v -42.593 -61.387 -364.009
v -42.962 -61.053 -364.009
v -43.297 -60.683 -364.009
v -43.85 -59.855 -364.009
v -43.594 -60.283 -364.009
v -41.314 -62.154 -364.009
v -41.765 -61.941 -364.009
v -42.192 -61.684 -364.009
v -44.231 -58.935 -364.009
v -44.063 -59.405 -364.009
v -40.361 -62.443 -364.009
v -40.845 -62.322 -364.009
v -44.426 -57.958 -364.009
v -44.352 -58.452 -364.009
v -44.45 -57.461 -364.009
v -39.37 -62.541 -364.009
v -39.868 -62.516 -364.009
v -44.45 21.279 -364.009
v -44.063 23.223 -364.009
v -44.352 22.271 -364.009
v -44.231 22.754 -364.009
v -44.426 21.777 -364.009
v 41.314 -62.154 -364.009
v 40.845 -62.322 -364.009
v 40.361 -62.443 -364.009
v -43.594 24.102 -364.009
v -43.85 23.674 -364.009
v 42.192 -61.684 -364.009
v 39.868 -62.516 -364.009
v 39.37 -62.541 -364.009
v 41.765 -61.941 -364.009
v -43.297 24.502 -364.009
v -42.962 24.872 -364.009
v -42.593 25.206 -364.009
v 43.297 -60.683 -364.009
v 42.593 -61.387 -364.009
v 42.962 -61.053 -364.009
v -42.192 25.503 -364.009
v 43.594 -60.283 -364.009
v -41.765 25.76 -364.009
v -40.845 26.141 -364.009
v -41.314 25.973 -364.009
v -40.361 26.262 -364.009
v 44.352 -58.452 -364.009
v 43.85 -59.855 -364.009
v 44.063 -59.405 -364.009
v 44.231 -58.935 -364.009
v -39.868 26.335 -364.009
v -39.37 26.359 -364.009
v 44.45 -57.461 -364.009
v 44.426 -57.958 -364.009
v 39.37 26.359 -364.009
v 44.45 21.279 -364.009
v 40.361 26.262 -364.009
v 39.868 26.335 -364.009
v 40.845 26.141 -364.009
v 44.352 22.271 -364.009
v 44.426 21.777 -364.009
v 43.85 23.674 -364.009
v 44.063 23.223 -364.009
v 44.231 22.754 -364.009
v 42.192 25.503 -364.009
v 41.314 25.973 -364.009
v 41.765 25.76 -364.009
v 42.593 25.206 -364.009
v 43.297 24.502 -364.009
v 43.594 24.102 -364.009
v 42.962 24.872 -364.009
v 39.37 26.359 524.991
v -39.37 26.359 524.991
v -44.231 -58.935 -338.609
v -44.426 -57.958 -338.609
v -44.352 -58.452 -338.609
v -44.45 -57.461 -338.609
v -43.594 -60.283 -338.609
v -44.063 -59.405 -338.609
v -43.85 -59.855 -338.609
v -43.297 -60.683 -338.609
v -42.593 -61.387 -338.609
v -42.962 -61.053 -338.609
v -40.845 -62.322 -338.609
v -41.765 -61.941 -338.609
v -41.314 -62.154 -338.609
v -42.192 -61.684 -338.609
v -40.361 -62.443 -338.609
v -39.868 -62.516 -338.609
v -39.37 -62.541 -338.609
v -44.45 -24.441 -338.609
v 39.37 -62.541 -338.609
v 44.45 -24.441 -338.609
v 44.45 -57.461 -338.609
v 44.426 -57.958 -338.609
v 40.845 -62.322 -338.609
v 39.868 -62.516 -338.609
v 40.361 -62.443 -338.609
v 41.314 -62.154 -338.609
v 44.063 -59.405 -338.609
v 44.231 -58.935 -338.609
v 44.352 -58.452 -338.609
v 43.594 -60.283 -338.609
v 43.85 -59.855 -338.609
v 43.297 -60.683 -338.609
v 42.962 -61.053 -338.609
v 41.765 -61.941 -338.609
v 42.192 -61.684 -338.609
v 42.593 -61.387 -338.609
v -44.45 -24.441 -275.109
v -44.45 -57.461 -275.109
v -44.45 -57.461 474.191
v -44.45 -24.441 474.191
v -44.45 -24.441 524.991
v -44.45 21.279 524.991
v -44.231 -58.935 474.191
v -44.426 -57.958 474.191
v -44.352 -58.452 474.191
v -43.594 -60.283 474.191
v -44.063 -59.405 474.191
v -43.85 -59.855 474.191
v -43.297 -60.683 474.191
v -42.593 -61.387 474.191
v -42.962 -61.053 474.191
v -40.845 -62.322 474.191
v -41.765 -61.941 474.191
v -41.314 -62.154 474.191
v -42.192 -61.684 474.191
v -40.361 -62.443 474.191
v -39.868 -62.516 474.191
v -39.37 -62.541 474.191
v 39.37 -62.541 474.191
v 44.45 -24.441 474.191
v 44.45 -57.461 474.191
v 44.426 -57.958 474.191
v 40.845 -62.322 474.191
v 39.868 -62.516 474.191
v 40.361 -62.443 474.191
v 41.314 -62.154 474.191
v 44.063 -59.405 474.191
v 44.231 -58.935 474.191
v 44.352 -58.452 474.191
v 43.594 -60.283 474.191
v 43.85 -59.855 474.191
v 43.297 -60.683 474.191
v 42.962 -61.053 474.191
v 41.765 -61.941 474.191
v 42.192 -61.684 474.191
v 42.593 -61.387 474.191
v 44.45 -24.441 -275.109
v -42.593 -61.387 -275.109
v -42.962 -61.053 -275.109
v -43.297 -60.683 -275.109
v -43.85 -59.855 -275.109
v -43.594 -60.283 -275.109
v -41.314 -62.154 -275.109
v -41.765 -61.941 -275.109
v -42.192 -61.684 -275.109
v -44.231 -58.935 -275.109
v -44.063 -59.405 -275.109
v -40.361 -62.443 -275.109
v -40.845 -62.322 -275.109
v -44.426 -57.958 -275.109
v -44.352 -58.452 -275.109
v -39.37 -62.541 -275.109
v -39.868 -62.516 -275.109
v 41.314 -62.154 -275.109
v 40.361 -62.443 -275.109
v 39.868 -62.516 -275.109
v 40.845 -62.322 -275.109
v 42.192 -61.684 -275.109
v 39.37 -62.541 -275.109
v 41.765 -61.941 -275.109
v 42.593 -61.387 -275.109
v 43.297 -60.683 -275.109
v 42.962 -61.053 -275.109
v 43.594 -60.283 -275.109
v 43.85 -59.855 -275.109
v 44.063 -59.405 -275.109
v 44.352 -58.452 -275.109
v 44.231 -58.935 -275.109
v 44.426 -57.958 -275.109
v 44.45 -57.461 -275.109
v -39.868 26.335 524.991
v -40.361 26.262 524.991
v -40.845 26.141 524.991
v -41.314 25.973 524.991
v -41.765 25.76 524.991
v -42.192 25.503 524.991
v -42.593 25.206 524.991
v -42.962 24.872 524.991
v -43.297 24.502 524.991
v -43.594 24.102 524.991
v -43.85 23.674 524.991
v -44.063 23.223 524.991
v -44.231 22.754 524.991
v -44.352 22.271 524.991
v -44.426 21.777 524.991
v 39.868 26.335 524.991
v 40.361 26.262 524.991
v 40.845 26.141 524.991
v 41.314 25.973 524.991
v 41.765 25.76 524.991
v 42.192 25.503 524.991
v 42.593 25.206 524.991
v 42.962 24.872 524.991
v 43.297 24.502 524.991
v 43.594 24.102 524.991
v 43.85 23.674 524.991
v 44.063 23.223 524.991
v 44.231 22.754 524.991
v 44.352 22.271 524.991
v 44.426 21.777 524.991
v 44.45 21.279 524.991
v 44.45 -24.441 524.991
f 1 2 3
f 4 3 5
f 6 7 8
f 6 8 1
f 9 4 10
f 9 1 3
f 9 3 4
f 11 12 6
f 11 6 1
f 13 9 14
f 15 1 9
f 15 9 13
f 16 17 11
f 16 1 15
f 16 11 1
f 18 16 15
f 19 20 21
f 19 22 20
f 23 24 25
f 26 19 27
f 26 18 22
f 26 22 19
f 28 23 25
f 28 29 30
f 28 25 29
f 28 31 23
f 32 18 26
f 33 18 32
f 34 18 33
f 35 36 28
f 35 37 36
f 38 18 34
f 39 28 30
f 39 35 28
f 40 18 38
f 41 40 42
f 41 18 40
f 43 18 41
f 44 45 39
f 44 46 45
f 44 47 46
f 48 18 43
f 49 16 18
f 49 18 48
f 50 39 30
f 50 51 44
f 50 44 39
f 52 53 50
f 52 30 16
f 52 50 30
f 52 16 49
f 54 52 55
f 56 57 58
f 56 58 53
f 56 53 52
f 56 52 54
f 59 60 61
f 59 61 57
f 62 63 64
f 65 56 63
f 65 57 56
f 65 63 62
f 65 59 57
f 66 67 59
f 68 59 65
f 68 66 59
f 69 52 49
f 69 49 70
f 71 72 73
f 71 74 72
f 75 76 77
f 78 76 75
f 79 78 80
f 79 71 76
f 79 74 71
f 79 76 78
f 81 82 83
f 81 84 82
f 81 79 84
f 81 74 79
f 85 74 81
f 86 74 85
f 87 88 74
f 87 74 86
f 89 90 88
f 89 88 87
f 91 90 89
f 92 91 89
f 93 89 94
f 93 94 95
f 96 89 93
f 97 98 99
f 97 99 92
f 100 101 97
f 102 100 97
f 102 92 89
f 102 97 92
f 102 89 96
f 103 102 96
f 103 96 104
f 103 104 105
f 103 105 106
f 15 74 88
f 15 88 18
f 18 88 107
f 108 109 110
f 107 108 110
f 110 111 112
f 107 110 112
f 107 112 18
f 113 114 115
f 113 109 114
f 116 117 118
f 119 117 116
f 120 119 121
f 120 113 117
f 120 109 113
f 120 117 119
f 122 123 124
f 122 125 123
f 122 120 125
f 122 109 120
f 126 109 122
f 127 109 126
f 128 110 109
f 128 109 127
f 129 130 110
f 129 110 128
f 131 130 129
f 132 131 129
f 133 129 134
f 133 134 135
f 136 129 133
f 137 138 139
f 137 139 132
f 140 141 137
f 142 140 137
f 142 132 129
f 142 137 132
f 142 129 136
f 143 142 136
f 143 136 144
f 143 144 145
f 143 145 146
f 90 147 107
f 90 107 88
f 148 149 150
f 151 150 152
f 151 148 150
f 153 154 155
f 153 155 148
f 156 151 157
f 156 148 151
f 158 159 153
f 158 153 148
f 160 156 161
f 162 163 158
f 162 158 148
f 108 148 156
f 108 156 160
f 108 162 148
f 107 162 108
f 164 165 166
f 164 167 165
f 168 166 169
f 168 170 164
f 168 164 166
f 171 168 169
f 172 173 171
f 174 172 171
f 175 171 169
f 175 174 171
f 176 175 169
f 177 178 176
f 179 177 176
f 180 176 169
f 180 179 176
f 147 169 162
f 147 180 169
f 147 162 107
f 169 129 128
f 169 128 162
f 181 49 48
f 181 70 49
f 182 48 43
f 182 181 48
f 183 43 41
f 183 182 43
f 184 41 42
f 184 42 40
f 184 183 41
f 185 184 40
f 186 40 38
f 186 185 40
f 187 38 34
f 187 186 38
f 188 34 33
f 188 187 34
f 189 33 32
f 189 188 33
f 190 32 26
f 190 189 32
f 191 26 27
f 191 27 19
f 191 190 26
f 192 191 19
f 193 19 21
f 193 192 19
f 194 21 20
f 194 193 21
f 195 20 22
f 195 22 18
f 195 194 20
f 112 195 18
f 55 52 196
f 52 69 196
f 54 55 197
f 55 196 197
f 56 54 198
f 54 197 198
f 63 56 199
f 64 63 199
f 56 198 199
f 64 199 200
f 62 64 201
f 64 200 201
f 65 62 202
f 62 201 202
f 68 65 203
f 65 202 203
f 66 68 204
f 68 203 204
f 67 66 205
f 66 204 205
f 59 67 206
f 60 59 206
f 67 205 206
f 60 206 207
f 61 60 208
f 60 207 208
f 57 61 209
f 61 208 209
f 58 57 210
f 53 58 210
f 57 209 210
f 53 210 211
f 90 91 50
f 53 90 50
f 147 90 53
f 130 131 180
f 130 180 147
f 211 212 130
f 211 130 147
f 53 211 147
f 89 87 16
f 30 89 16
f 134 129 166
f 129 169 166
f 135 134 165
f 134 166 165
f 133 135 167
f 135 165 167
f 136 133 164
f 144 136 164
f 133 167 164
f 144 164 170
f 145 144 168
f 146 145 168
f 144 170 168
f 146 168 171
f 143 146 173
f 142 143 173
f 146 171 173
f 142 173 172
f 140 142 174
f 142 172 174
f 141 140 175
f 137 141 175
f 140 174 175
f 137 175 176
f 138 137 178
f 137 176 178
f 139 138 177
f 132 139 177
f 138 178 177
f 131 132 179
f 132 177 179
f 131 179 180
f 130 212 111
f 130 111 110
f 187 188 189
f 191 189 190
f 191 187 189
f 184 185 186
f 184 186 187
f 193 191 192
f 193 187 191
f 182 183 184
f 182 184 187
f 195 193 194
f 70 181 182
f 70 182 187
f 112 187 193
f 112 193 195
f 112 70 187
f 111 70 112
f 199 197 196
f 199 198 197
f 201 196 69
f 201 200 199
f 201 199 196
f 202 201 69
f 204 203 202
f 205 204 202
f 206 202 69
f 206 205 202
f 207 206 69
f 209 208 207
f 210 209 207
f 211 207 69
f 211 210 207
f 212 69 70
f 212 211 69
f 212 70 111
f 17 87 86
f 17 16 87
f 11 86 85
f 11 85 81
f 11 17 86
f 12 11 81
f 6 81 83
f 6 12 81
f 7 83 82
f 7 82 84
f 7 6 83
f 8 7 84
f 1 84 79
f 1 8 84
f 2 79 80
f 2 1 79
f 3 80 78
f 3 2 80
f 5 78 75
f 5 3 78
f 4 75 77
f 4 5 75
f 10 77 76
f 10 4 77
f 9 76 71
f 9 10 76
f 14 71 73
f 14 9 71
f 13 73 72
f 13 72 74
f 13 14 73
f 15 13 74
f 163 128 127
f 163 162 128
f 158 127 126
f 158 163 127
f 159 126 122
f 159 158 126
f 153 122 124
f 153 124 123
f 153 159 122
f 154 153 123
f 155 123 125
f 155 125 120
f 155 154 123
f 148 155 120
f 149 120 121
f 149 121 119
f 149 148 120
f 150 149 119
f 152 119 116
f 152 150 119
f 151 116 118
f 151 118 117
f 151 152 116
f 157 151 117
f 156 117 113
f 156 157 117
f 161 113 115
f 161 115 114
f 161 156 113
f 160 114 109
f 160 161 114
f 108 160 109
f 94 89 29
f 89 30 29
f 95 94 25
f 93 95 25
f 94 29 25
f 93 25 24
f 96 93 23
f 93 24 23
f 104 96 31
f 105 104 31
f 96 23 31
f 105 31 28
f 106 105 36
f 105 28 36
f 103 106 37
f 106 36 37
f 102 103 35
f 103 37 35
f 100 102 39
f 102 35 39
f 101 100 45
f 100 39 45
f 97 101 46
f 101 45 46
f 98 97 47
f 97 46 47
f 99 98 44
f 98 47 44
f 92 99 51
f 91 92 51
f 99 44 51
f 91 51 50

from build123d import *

# Parameters (mm, degrees)
F1_DEPTH = 44.45
F2_R     = 5.08


with BuildPart() as f1:
    # F0 (on Right) → F1 (new body, symmetric)
    with BuildSketch(Plane.YZ):
        Polygon((26.359464475, -364.0086964671), (26.359464475, 524.9913035329), (-24.440535525, 524.9913035329), (-24.440535525, 474.1913035329), (-62.540535525, 474.1913035329), (-62.540535525, -275.1086964671), (-24.440535525, -275.1086964671), (-24.440535525, -338.6086964671), (-62.540535525, -338.6086964671), (-62.540535525, -364.0086964671), align=None)
    extrude(amount=F1_DEPTH, both=True)

    # F2
    f2_edges = [f1.edges().sort_by_distance(p)[0] for p in [
        (44.45, -62.540536, 99.541304),
        (44.45, -62.540536, -351.308696),
        (-44.45, -62.540536, -351.308696),
        (-44.45, -62.540536, 99.541304),
        (44.45, 26.359464, 80.491304),
        (-44.45, 26.359464, 80.491304),
    ]]
    fillet(f2_edges, radius=F2_R)


solid = f1.part
